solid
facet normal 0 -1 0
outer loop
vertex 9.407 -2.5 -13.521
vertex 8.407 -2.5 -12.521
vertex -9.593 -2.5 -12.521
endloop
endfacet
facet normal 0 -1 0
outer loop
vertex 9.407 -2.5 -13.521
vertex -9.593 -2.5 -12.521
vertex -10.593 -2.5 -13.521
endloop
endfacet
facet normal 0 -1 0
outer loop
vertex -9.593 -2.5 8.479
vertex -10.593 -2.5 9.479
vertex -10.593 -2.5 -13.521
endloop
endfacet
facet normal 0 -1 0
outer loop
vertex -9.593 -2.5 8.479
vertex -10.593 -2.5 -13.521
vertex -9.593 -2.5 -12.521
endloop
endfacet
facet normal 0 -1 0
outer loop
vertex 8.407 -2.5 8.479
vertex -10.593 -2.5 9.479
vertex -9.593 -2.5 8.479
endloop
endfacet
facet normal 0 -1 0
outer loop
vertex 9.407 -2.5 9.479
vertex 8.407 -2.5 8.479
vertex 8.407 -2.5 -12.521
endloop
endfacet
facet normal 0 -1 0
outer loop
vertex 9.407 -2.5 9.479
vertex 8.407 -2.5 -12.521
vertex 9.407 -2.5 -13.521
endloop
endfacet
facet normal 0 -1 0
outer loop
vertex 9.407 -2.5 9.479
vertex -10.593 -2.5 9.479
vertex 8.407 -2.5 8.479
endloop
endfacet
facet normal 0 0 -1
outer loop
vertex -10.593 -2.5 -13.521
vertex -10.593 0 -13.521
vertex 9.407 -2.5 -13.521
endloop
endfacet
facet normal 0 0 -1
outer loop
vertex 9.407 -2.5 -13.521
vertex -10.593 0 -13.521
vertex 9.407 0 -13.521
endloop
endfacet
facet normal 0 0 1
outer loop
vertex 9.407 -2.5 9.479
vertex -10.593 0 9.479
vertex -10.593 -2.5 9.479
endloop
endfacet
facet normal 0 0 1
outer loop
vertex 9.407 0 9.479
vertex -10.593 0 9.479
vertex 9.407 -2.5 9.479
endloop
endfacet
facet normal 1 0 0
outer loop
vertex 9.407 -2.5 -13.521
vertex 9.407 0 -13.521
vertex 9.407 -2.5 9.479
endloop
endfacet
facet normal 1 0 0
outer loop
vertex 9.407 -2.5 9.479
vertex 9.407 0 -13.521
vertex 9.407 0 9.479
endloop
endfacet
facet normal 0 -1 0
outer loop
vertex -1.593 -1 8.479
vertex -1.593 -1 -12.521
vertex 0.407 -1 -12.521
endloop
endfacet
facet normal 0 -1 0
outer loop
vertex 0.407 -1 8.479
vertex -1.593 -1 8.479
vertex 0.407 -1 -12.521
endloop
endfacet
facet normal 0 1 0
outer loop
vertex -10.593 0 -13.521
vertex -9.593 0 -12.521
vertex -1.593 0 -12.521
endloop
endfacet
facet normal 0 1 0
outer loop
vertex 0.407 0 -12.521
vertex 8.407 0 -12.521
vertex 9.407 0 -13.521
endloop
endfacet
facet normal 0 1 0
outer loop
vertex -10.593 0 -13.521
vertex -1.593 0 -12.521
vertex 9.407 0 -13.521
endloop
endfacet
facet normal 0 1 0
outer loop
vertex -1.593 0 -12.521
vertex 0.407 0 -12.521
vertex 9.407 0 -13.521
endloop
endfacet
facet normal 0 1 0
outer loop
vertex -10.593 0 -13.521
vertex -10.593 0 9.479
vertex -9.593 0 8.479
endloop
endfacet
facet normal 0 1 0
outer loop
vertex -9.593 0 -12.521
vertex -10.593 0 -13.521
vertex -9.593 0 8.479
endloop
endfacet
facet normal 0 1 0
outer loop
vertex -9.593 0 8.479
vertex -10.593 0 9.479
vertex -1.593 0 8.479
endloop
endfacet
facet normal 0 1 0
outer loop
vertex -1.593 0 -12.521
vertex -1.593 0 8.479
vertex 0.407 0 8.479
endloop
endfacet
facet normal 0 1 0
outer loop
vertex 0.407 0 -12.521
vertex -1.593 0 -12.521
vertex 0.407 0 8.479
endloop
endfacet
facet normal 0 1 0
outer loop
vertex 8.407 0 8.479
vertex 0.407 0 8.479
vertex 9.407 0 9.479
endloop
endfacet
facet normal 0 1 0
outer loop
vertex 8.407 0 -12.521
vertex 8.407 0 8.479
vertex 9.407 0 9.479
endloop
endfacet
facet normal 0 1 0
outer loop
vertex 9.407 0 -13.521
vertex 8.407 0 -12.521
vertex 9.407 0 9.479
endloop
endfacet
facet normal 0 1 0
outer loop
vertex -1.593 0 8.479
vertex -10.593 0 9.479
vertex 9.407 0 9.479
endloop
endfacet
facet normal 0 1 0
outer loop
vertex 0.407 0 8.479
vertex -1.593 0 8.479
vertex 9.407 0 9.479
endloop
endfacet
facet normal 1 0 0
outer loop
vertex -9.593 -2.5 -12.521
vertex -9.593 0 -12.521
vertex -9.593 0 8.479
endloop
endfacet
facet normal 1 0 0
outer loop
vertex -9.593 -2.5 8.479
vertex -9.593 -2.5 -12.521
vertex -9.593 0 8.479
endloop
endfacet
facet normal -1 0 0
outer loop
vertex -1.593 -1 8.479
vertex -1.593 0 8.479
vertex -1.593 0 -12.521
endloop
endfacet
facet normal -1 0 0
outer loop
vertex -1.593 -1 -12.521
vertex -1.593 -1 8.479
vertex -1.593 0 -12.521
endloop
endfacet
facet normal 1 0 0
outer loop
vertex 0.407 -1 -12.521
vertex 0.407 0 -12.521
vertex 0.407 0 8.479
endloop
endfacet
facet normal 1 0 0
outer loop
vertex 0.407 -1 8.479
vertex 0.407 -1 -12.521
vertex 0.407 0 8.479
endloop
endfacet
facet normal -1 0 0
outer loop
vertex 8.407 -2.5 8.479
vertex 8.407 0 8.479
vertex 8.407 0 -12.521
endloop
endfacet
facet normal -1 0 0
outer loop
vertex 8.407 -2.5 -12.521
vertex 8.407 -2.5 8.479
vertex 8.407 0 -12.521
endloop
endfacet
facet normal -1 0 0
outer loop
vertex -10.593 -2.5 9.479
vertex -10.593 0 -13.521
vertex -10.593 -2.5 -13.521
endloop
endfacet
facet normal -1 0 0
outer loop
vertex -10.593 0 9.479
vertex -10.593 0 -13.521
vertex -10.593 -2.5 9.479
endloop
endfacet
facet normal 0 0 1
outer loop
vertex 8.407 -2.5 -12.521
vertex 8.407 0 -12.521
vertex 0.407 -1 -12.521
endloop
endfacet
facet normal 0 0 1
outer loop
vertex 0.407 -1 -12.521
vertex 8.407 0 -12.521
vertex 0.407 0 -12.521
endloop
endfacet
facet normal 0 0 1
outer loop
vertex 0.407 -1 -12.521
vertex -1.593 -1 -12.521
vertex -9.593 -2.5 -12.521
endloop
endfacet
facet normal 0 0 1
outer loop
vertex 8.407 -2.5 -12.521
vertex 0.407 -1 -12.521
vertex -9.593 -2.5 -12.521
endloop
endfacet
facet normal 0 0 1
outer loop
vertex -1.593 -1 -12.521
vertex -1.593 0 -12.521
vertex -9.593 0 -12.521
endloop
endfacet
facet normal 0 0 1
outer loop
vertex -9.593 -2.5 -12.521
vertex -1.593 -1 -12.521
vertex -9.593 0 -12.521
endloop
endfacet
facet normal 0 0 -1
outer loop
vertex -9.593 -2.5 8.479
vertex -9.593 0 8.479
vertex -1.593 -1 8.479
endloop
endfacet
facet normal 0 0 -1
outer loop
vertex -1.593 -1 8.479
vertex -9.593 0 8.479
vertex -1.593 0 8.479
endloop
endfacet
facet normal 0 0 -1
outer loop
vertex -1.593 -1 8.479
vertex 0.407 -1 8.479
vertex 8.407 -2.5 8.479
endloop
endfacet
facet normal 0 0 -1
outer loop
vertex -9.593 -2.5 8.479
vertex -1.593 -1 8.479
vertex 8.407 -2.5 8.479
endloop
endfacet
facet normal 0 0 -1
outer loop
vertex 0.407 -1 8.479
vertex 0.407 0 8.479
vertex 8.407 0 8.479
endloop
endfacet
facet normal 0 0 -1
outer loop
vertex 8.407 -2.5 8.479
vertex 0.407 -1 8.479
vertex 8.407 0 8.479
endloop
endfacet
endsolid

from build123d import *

# Parameters (mm, degrees)
F0_W     = 20
F0_H     = 23
F1_DEPTH = 2.5
F0_W_2   = 1
F0_H_2   = 7
F0_H_3   = 6
F0_H_4   = 1
F2_DEPTH = 1


with BuildPart() as f1:
    # F0 (on Front) → F1 (new body)
    with BuildSketch(Plane.XZ):
        with Locations((-0.5926657468, -2.021088949)):
            Rectangle(F0_W, F0_H)
        Polygon((-9.5926657468, 2.478911051), (-9.5926657468, 8.478911051), (-1.5926657468, 8.478911051), (-0.5926657468, 8.478911051), (0.4073342532, 8.478911051), (8.4073342532, 8.478911051), (8.4073342532, 2.478911051), (8.4073342532, 1.478911051), (8.4073342532, -5.521088949), (8.4073342532, -6.521088949), (8.4073342532, -12.521088949), (0.4073342532, -12.521088949), (-0.5926657468, -12.521088949), (-1.5926657468, -12.521088949), (-9.5926657468, -12.521088949), (-9.5926657468, -6.521088949), (-9.5926657468, -5.521088949), (-9.5926657468, 1.478911051), align=None, mode=Mode.SUBTRACT)
    extrude(amount=F1_DEPTH)

    # F0 (on Front) → F2 (join)
    with BuildSketch(Plane.XZ):
        with Locations((-1.0926657468, -2.021088949)):
            Rectangle(F0_W_2, F0_H_2)
        with Locations((-1.0926657468, -9.521088949)):
            Rectangle(F0_W_2, F0_H_3)
        with Locations((-0.0926657468, -9.521088949)):
            Rectangle(F0_W_2, F0_H_3)
        with Locations((-1.0926657468, 5.478911051)):
            Rectangle(F0_W_2, F0_H_3)
        with Locations((-0.0926657468, 5.478911051)):
            Rectangle(F0_W_2, F0_H_3)
        with Locations((-1.0926657468, 1.978911051)):
            Rectangle(F0_W_2, F0_H_4)
        with Locations((-0.0926657468, 1.978911051)):
            Rectangle(F0_W_2, F0_H_4)
        with Locations((-0.0926657468, -2.021088949)):
            Rectangle(F0_W_2, F0_H_2)
        with Locations((-0.0926657468, -6.021088949)):
            Rectangle(F0_W_2, F0_H_4)
        with Locations((-1.0926657468, -6.021088949)):
            Rectangle(F0_W_2, F0_H_4)
    extrude(amount=F2_DEPTH)


solid = f1.part
